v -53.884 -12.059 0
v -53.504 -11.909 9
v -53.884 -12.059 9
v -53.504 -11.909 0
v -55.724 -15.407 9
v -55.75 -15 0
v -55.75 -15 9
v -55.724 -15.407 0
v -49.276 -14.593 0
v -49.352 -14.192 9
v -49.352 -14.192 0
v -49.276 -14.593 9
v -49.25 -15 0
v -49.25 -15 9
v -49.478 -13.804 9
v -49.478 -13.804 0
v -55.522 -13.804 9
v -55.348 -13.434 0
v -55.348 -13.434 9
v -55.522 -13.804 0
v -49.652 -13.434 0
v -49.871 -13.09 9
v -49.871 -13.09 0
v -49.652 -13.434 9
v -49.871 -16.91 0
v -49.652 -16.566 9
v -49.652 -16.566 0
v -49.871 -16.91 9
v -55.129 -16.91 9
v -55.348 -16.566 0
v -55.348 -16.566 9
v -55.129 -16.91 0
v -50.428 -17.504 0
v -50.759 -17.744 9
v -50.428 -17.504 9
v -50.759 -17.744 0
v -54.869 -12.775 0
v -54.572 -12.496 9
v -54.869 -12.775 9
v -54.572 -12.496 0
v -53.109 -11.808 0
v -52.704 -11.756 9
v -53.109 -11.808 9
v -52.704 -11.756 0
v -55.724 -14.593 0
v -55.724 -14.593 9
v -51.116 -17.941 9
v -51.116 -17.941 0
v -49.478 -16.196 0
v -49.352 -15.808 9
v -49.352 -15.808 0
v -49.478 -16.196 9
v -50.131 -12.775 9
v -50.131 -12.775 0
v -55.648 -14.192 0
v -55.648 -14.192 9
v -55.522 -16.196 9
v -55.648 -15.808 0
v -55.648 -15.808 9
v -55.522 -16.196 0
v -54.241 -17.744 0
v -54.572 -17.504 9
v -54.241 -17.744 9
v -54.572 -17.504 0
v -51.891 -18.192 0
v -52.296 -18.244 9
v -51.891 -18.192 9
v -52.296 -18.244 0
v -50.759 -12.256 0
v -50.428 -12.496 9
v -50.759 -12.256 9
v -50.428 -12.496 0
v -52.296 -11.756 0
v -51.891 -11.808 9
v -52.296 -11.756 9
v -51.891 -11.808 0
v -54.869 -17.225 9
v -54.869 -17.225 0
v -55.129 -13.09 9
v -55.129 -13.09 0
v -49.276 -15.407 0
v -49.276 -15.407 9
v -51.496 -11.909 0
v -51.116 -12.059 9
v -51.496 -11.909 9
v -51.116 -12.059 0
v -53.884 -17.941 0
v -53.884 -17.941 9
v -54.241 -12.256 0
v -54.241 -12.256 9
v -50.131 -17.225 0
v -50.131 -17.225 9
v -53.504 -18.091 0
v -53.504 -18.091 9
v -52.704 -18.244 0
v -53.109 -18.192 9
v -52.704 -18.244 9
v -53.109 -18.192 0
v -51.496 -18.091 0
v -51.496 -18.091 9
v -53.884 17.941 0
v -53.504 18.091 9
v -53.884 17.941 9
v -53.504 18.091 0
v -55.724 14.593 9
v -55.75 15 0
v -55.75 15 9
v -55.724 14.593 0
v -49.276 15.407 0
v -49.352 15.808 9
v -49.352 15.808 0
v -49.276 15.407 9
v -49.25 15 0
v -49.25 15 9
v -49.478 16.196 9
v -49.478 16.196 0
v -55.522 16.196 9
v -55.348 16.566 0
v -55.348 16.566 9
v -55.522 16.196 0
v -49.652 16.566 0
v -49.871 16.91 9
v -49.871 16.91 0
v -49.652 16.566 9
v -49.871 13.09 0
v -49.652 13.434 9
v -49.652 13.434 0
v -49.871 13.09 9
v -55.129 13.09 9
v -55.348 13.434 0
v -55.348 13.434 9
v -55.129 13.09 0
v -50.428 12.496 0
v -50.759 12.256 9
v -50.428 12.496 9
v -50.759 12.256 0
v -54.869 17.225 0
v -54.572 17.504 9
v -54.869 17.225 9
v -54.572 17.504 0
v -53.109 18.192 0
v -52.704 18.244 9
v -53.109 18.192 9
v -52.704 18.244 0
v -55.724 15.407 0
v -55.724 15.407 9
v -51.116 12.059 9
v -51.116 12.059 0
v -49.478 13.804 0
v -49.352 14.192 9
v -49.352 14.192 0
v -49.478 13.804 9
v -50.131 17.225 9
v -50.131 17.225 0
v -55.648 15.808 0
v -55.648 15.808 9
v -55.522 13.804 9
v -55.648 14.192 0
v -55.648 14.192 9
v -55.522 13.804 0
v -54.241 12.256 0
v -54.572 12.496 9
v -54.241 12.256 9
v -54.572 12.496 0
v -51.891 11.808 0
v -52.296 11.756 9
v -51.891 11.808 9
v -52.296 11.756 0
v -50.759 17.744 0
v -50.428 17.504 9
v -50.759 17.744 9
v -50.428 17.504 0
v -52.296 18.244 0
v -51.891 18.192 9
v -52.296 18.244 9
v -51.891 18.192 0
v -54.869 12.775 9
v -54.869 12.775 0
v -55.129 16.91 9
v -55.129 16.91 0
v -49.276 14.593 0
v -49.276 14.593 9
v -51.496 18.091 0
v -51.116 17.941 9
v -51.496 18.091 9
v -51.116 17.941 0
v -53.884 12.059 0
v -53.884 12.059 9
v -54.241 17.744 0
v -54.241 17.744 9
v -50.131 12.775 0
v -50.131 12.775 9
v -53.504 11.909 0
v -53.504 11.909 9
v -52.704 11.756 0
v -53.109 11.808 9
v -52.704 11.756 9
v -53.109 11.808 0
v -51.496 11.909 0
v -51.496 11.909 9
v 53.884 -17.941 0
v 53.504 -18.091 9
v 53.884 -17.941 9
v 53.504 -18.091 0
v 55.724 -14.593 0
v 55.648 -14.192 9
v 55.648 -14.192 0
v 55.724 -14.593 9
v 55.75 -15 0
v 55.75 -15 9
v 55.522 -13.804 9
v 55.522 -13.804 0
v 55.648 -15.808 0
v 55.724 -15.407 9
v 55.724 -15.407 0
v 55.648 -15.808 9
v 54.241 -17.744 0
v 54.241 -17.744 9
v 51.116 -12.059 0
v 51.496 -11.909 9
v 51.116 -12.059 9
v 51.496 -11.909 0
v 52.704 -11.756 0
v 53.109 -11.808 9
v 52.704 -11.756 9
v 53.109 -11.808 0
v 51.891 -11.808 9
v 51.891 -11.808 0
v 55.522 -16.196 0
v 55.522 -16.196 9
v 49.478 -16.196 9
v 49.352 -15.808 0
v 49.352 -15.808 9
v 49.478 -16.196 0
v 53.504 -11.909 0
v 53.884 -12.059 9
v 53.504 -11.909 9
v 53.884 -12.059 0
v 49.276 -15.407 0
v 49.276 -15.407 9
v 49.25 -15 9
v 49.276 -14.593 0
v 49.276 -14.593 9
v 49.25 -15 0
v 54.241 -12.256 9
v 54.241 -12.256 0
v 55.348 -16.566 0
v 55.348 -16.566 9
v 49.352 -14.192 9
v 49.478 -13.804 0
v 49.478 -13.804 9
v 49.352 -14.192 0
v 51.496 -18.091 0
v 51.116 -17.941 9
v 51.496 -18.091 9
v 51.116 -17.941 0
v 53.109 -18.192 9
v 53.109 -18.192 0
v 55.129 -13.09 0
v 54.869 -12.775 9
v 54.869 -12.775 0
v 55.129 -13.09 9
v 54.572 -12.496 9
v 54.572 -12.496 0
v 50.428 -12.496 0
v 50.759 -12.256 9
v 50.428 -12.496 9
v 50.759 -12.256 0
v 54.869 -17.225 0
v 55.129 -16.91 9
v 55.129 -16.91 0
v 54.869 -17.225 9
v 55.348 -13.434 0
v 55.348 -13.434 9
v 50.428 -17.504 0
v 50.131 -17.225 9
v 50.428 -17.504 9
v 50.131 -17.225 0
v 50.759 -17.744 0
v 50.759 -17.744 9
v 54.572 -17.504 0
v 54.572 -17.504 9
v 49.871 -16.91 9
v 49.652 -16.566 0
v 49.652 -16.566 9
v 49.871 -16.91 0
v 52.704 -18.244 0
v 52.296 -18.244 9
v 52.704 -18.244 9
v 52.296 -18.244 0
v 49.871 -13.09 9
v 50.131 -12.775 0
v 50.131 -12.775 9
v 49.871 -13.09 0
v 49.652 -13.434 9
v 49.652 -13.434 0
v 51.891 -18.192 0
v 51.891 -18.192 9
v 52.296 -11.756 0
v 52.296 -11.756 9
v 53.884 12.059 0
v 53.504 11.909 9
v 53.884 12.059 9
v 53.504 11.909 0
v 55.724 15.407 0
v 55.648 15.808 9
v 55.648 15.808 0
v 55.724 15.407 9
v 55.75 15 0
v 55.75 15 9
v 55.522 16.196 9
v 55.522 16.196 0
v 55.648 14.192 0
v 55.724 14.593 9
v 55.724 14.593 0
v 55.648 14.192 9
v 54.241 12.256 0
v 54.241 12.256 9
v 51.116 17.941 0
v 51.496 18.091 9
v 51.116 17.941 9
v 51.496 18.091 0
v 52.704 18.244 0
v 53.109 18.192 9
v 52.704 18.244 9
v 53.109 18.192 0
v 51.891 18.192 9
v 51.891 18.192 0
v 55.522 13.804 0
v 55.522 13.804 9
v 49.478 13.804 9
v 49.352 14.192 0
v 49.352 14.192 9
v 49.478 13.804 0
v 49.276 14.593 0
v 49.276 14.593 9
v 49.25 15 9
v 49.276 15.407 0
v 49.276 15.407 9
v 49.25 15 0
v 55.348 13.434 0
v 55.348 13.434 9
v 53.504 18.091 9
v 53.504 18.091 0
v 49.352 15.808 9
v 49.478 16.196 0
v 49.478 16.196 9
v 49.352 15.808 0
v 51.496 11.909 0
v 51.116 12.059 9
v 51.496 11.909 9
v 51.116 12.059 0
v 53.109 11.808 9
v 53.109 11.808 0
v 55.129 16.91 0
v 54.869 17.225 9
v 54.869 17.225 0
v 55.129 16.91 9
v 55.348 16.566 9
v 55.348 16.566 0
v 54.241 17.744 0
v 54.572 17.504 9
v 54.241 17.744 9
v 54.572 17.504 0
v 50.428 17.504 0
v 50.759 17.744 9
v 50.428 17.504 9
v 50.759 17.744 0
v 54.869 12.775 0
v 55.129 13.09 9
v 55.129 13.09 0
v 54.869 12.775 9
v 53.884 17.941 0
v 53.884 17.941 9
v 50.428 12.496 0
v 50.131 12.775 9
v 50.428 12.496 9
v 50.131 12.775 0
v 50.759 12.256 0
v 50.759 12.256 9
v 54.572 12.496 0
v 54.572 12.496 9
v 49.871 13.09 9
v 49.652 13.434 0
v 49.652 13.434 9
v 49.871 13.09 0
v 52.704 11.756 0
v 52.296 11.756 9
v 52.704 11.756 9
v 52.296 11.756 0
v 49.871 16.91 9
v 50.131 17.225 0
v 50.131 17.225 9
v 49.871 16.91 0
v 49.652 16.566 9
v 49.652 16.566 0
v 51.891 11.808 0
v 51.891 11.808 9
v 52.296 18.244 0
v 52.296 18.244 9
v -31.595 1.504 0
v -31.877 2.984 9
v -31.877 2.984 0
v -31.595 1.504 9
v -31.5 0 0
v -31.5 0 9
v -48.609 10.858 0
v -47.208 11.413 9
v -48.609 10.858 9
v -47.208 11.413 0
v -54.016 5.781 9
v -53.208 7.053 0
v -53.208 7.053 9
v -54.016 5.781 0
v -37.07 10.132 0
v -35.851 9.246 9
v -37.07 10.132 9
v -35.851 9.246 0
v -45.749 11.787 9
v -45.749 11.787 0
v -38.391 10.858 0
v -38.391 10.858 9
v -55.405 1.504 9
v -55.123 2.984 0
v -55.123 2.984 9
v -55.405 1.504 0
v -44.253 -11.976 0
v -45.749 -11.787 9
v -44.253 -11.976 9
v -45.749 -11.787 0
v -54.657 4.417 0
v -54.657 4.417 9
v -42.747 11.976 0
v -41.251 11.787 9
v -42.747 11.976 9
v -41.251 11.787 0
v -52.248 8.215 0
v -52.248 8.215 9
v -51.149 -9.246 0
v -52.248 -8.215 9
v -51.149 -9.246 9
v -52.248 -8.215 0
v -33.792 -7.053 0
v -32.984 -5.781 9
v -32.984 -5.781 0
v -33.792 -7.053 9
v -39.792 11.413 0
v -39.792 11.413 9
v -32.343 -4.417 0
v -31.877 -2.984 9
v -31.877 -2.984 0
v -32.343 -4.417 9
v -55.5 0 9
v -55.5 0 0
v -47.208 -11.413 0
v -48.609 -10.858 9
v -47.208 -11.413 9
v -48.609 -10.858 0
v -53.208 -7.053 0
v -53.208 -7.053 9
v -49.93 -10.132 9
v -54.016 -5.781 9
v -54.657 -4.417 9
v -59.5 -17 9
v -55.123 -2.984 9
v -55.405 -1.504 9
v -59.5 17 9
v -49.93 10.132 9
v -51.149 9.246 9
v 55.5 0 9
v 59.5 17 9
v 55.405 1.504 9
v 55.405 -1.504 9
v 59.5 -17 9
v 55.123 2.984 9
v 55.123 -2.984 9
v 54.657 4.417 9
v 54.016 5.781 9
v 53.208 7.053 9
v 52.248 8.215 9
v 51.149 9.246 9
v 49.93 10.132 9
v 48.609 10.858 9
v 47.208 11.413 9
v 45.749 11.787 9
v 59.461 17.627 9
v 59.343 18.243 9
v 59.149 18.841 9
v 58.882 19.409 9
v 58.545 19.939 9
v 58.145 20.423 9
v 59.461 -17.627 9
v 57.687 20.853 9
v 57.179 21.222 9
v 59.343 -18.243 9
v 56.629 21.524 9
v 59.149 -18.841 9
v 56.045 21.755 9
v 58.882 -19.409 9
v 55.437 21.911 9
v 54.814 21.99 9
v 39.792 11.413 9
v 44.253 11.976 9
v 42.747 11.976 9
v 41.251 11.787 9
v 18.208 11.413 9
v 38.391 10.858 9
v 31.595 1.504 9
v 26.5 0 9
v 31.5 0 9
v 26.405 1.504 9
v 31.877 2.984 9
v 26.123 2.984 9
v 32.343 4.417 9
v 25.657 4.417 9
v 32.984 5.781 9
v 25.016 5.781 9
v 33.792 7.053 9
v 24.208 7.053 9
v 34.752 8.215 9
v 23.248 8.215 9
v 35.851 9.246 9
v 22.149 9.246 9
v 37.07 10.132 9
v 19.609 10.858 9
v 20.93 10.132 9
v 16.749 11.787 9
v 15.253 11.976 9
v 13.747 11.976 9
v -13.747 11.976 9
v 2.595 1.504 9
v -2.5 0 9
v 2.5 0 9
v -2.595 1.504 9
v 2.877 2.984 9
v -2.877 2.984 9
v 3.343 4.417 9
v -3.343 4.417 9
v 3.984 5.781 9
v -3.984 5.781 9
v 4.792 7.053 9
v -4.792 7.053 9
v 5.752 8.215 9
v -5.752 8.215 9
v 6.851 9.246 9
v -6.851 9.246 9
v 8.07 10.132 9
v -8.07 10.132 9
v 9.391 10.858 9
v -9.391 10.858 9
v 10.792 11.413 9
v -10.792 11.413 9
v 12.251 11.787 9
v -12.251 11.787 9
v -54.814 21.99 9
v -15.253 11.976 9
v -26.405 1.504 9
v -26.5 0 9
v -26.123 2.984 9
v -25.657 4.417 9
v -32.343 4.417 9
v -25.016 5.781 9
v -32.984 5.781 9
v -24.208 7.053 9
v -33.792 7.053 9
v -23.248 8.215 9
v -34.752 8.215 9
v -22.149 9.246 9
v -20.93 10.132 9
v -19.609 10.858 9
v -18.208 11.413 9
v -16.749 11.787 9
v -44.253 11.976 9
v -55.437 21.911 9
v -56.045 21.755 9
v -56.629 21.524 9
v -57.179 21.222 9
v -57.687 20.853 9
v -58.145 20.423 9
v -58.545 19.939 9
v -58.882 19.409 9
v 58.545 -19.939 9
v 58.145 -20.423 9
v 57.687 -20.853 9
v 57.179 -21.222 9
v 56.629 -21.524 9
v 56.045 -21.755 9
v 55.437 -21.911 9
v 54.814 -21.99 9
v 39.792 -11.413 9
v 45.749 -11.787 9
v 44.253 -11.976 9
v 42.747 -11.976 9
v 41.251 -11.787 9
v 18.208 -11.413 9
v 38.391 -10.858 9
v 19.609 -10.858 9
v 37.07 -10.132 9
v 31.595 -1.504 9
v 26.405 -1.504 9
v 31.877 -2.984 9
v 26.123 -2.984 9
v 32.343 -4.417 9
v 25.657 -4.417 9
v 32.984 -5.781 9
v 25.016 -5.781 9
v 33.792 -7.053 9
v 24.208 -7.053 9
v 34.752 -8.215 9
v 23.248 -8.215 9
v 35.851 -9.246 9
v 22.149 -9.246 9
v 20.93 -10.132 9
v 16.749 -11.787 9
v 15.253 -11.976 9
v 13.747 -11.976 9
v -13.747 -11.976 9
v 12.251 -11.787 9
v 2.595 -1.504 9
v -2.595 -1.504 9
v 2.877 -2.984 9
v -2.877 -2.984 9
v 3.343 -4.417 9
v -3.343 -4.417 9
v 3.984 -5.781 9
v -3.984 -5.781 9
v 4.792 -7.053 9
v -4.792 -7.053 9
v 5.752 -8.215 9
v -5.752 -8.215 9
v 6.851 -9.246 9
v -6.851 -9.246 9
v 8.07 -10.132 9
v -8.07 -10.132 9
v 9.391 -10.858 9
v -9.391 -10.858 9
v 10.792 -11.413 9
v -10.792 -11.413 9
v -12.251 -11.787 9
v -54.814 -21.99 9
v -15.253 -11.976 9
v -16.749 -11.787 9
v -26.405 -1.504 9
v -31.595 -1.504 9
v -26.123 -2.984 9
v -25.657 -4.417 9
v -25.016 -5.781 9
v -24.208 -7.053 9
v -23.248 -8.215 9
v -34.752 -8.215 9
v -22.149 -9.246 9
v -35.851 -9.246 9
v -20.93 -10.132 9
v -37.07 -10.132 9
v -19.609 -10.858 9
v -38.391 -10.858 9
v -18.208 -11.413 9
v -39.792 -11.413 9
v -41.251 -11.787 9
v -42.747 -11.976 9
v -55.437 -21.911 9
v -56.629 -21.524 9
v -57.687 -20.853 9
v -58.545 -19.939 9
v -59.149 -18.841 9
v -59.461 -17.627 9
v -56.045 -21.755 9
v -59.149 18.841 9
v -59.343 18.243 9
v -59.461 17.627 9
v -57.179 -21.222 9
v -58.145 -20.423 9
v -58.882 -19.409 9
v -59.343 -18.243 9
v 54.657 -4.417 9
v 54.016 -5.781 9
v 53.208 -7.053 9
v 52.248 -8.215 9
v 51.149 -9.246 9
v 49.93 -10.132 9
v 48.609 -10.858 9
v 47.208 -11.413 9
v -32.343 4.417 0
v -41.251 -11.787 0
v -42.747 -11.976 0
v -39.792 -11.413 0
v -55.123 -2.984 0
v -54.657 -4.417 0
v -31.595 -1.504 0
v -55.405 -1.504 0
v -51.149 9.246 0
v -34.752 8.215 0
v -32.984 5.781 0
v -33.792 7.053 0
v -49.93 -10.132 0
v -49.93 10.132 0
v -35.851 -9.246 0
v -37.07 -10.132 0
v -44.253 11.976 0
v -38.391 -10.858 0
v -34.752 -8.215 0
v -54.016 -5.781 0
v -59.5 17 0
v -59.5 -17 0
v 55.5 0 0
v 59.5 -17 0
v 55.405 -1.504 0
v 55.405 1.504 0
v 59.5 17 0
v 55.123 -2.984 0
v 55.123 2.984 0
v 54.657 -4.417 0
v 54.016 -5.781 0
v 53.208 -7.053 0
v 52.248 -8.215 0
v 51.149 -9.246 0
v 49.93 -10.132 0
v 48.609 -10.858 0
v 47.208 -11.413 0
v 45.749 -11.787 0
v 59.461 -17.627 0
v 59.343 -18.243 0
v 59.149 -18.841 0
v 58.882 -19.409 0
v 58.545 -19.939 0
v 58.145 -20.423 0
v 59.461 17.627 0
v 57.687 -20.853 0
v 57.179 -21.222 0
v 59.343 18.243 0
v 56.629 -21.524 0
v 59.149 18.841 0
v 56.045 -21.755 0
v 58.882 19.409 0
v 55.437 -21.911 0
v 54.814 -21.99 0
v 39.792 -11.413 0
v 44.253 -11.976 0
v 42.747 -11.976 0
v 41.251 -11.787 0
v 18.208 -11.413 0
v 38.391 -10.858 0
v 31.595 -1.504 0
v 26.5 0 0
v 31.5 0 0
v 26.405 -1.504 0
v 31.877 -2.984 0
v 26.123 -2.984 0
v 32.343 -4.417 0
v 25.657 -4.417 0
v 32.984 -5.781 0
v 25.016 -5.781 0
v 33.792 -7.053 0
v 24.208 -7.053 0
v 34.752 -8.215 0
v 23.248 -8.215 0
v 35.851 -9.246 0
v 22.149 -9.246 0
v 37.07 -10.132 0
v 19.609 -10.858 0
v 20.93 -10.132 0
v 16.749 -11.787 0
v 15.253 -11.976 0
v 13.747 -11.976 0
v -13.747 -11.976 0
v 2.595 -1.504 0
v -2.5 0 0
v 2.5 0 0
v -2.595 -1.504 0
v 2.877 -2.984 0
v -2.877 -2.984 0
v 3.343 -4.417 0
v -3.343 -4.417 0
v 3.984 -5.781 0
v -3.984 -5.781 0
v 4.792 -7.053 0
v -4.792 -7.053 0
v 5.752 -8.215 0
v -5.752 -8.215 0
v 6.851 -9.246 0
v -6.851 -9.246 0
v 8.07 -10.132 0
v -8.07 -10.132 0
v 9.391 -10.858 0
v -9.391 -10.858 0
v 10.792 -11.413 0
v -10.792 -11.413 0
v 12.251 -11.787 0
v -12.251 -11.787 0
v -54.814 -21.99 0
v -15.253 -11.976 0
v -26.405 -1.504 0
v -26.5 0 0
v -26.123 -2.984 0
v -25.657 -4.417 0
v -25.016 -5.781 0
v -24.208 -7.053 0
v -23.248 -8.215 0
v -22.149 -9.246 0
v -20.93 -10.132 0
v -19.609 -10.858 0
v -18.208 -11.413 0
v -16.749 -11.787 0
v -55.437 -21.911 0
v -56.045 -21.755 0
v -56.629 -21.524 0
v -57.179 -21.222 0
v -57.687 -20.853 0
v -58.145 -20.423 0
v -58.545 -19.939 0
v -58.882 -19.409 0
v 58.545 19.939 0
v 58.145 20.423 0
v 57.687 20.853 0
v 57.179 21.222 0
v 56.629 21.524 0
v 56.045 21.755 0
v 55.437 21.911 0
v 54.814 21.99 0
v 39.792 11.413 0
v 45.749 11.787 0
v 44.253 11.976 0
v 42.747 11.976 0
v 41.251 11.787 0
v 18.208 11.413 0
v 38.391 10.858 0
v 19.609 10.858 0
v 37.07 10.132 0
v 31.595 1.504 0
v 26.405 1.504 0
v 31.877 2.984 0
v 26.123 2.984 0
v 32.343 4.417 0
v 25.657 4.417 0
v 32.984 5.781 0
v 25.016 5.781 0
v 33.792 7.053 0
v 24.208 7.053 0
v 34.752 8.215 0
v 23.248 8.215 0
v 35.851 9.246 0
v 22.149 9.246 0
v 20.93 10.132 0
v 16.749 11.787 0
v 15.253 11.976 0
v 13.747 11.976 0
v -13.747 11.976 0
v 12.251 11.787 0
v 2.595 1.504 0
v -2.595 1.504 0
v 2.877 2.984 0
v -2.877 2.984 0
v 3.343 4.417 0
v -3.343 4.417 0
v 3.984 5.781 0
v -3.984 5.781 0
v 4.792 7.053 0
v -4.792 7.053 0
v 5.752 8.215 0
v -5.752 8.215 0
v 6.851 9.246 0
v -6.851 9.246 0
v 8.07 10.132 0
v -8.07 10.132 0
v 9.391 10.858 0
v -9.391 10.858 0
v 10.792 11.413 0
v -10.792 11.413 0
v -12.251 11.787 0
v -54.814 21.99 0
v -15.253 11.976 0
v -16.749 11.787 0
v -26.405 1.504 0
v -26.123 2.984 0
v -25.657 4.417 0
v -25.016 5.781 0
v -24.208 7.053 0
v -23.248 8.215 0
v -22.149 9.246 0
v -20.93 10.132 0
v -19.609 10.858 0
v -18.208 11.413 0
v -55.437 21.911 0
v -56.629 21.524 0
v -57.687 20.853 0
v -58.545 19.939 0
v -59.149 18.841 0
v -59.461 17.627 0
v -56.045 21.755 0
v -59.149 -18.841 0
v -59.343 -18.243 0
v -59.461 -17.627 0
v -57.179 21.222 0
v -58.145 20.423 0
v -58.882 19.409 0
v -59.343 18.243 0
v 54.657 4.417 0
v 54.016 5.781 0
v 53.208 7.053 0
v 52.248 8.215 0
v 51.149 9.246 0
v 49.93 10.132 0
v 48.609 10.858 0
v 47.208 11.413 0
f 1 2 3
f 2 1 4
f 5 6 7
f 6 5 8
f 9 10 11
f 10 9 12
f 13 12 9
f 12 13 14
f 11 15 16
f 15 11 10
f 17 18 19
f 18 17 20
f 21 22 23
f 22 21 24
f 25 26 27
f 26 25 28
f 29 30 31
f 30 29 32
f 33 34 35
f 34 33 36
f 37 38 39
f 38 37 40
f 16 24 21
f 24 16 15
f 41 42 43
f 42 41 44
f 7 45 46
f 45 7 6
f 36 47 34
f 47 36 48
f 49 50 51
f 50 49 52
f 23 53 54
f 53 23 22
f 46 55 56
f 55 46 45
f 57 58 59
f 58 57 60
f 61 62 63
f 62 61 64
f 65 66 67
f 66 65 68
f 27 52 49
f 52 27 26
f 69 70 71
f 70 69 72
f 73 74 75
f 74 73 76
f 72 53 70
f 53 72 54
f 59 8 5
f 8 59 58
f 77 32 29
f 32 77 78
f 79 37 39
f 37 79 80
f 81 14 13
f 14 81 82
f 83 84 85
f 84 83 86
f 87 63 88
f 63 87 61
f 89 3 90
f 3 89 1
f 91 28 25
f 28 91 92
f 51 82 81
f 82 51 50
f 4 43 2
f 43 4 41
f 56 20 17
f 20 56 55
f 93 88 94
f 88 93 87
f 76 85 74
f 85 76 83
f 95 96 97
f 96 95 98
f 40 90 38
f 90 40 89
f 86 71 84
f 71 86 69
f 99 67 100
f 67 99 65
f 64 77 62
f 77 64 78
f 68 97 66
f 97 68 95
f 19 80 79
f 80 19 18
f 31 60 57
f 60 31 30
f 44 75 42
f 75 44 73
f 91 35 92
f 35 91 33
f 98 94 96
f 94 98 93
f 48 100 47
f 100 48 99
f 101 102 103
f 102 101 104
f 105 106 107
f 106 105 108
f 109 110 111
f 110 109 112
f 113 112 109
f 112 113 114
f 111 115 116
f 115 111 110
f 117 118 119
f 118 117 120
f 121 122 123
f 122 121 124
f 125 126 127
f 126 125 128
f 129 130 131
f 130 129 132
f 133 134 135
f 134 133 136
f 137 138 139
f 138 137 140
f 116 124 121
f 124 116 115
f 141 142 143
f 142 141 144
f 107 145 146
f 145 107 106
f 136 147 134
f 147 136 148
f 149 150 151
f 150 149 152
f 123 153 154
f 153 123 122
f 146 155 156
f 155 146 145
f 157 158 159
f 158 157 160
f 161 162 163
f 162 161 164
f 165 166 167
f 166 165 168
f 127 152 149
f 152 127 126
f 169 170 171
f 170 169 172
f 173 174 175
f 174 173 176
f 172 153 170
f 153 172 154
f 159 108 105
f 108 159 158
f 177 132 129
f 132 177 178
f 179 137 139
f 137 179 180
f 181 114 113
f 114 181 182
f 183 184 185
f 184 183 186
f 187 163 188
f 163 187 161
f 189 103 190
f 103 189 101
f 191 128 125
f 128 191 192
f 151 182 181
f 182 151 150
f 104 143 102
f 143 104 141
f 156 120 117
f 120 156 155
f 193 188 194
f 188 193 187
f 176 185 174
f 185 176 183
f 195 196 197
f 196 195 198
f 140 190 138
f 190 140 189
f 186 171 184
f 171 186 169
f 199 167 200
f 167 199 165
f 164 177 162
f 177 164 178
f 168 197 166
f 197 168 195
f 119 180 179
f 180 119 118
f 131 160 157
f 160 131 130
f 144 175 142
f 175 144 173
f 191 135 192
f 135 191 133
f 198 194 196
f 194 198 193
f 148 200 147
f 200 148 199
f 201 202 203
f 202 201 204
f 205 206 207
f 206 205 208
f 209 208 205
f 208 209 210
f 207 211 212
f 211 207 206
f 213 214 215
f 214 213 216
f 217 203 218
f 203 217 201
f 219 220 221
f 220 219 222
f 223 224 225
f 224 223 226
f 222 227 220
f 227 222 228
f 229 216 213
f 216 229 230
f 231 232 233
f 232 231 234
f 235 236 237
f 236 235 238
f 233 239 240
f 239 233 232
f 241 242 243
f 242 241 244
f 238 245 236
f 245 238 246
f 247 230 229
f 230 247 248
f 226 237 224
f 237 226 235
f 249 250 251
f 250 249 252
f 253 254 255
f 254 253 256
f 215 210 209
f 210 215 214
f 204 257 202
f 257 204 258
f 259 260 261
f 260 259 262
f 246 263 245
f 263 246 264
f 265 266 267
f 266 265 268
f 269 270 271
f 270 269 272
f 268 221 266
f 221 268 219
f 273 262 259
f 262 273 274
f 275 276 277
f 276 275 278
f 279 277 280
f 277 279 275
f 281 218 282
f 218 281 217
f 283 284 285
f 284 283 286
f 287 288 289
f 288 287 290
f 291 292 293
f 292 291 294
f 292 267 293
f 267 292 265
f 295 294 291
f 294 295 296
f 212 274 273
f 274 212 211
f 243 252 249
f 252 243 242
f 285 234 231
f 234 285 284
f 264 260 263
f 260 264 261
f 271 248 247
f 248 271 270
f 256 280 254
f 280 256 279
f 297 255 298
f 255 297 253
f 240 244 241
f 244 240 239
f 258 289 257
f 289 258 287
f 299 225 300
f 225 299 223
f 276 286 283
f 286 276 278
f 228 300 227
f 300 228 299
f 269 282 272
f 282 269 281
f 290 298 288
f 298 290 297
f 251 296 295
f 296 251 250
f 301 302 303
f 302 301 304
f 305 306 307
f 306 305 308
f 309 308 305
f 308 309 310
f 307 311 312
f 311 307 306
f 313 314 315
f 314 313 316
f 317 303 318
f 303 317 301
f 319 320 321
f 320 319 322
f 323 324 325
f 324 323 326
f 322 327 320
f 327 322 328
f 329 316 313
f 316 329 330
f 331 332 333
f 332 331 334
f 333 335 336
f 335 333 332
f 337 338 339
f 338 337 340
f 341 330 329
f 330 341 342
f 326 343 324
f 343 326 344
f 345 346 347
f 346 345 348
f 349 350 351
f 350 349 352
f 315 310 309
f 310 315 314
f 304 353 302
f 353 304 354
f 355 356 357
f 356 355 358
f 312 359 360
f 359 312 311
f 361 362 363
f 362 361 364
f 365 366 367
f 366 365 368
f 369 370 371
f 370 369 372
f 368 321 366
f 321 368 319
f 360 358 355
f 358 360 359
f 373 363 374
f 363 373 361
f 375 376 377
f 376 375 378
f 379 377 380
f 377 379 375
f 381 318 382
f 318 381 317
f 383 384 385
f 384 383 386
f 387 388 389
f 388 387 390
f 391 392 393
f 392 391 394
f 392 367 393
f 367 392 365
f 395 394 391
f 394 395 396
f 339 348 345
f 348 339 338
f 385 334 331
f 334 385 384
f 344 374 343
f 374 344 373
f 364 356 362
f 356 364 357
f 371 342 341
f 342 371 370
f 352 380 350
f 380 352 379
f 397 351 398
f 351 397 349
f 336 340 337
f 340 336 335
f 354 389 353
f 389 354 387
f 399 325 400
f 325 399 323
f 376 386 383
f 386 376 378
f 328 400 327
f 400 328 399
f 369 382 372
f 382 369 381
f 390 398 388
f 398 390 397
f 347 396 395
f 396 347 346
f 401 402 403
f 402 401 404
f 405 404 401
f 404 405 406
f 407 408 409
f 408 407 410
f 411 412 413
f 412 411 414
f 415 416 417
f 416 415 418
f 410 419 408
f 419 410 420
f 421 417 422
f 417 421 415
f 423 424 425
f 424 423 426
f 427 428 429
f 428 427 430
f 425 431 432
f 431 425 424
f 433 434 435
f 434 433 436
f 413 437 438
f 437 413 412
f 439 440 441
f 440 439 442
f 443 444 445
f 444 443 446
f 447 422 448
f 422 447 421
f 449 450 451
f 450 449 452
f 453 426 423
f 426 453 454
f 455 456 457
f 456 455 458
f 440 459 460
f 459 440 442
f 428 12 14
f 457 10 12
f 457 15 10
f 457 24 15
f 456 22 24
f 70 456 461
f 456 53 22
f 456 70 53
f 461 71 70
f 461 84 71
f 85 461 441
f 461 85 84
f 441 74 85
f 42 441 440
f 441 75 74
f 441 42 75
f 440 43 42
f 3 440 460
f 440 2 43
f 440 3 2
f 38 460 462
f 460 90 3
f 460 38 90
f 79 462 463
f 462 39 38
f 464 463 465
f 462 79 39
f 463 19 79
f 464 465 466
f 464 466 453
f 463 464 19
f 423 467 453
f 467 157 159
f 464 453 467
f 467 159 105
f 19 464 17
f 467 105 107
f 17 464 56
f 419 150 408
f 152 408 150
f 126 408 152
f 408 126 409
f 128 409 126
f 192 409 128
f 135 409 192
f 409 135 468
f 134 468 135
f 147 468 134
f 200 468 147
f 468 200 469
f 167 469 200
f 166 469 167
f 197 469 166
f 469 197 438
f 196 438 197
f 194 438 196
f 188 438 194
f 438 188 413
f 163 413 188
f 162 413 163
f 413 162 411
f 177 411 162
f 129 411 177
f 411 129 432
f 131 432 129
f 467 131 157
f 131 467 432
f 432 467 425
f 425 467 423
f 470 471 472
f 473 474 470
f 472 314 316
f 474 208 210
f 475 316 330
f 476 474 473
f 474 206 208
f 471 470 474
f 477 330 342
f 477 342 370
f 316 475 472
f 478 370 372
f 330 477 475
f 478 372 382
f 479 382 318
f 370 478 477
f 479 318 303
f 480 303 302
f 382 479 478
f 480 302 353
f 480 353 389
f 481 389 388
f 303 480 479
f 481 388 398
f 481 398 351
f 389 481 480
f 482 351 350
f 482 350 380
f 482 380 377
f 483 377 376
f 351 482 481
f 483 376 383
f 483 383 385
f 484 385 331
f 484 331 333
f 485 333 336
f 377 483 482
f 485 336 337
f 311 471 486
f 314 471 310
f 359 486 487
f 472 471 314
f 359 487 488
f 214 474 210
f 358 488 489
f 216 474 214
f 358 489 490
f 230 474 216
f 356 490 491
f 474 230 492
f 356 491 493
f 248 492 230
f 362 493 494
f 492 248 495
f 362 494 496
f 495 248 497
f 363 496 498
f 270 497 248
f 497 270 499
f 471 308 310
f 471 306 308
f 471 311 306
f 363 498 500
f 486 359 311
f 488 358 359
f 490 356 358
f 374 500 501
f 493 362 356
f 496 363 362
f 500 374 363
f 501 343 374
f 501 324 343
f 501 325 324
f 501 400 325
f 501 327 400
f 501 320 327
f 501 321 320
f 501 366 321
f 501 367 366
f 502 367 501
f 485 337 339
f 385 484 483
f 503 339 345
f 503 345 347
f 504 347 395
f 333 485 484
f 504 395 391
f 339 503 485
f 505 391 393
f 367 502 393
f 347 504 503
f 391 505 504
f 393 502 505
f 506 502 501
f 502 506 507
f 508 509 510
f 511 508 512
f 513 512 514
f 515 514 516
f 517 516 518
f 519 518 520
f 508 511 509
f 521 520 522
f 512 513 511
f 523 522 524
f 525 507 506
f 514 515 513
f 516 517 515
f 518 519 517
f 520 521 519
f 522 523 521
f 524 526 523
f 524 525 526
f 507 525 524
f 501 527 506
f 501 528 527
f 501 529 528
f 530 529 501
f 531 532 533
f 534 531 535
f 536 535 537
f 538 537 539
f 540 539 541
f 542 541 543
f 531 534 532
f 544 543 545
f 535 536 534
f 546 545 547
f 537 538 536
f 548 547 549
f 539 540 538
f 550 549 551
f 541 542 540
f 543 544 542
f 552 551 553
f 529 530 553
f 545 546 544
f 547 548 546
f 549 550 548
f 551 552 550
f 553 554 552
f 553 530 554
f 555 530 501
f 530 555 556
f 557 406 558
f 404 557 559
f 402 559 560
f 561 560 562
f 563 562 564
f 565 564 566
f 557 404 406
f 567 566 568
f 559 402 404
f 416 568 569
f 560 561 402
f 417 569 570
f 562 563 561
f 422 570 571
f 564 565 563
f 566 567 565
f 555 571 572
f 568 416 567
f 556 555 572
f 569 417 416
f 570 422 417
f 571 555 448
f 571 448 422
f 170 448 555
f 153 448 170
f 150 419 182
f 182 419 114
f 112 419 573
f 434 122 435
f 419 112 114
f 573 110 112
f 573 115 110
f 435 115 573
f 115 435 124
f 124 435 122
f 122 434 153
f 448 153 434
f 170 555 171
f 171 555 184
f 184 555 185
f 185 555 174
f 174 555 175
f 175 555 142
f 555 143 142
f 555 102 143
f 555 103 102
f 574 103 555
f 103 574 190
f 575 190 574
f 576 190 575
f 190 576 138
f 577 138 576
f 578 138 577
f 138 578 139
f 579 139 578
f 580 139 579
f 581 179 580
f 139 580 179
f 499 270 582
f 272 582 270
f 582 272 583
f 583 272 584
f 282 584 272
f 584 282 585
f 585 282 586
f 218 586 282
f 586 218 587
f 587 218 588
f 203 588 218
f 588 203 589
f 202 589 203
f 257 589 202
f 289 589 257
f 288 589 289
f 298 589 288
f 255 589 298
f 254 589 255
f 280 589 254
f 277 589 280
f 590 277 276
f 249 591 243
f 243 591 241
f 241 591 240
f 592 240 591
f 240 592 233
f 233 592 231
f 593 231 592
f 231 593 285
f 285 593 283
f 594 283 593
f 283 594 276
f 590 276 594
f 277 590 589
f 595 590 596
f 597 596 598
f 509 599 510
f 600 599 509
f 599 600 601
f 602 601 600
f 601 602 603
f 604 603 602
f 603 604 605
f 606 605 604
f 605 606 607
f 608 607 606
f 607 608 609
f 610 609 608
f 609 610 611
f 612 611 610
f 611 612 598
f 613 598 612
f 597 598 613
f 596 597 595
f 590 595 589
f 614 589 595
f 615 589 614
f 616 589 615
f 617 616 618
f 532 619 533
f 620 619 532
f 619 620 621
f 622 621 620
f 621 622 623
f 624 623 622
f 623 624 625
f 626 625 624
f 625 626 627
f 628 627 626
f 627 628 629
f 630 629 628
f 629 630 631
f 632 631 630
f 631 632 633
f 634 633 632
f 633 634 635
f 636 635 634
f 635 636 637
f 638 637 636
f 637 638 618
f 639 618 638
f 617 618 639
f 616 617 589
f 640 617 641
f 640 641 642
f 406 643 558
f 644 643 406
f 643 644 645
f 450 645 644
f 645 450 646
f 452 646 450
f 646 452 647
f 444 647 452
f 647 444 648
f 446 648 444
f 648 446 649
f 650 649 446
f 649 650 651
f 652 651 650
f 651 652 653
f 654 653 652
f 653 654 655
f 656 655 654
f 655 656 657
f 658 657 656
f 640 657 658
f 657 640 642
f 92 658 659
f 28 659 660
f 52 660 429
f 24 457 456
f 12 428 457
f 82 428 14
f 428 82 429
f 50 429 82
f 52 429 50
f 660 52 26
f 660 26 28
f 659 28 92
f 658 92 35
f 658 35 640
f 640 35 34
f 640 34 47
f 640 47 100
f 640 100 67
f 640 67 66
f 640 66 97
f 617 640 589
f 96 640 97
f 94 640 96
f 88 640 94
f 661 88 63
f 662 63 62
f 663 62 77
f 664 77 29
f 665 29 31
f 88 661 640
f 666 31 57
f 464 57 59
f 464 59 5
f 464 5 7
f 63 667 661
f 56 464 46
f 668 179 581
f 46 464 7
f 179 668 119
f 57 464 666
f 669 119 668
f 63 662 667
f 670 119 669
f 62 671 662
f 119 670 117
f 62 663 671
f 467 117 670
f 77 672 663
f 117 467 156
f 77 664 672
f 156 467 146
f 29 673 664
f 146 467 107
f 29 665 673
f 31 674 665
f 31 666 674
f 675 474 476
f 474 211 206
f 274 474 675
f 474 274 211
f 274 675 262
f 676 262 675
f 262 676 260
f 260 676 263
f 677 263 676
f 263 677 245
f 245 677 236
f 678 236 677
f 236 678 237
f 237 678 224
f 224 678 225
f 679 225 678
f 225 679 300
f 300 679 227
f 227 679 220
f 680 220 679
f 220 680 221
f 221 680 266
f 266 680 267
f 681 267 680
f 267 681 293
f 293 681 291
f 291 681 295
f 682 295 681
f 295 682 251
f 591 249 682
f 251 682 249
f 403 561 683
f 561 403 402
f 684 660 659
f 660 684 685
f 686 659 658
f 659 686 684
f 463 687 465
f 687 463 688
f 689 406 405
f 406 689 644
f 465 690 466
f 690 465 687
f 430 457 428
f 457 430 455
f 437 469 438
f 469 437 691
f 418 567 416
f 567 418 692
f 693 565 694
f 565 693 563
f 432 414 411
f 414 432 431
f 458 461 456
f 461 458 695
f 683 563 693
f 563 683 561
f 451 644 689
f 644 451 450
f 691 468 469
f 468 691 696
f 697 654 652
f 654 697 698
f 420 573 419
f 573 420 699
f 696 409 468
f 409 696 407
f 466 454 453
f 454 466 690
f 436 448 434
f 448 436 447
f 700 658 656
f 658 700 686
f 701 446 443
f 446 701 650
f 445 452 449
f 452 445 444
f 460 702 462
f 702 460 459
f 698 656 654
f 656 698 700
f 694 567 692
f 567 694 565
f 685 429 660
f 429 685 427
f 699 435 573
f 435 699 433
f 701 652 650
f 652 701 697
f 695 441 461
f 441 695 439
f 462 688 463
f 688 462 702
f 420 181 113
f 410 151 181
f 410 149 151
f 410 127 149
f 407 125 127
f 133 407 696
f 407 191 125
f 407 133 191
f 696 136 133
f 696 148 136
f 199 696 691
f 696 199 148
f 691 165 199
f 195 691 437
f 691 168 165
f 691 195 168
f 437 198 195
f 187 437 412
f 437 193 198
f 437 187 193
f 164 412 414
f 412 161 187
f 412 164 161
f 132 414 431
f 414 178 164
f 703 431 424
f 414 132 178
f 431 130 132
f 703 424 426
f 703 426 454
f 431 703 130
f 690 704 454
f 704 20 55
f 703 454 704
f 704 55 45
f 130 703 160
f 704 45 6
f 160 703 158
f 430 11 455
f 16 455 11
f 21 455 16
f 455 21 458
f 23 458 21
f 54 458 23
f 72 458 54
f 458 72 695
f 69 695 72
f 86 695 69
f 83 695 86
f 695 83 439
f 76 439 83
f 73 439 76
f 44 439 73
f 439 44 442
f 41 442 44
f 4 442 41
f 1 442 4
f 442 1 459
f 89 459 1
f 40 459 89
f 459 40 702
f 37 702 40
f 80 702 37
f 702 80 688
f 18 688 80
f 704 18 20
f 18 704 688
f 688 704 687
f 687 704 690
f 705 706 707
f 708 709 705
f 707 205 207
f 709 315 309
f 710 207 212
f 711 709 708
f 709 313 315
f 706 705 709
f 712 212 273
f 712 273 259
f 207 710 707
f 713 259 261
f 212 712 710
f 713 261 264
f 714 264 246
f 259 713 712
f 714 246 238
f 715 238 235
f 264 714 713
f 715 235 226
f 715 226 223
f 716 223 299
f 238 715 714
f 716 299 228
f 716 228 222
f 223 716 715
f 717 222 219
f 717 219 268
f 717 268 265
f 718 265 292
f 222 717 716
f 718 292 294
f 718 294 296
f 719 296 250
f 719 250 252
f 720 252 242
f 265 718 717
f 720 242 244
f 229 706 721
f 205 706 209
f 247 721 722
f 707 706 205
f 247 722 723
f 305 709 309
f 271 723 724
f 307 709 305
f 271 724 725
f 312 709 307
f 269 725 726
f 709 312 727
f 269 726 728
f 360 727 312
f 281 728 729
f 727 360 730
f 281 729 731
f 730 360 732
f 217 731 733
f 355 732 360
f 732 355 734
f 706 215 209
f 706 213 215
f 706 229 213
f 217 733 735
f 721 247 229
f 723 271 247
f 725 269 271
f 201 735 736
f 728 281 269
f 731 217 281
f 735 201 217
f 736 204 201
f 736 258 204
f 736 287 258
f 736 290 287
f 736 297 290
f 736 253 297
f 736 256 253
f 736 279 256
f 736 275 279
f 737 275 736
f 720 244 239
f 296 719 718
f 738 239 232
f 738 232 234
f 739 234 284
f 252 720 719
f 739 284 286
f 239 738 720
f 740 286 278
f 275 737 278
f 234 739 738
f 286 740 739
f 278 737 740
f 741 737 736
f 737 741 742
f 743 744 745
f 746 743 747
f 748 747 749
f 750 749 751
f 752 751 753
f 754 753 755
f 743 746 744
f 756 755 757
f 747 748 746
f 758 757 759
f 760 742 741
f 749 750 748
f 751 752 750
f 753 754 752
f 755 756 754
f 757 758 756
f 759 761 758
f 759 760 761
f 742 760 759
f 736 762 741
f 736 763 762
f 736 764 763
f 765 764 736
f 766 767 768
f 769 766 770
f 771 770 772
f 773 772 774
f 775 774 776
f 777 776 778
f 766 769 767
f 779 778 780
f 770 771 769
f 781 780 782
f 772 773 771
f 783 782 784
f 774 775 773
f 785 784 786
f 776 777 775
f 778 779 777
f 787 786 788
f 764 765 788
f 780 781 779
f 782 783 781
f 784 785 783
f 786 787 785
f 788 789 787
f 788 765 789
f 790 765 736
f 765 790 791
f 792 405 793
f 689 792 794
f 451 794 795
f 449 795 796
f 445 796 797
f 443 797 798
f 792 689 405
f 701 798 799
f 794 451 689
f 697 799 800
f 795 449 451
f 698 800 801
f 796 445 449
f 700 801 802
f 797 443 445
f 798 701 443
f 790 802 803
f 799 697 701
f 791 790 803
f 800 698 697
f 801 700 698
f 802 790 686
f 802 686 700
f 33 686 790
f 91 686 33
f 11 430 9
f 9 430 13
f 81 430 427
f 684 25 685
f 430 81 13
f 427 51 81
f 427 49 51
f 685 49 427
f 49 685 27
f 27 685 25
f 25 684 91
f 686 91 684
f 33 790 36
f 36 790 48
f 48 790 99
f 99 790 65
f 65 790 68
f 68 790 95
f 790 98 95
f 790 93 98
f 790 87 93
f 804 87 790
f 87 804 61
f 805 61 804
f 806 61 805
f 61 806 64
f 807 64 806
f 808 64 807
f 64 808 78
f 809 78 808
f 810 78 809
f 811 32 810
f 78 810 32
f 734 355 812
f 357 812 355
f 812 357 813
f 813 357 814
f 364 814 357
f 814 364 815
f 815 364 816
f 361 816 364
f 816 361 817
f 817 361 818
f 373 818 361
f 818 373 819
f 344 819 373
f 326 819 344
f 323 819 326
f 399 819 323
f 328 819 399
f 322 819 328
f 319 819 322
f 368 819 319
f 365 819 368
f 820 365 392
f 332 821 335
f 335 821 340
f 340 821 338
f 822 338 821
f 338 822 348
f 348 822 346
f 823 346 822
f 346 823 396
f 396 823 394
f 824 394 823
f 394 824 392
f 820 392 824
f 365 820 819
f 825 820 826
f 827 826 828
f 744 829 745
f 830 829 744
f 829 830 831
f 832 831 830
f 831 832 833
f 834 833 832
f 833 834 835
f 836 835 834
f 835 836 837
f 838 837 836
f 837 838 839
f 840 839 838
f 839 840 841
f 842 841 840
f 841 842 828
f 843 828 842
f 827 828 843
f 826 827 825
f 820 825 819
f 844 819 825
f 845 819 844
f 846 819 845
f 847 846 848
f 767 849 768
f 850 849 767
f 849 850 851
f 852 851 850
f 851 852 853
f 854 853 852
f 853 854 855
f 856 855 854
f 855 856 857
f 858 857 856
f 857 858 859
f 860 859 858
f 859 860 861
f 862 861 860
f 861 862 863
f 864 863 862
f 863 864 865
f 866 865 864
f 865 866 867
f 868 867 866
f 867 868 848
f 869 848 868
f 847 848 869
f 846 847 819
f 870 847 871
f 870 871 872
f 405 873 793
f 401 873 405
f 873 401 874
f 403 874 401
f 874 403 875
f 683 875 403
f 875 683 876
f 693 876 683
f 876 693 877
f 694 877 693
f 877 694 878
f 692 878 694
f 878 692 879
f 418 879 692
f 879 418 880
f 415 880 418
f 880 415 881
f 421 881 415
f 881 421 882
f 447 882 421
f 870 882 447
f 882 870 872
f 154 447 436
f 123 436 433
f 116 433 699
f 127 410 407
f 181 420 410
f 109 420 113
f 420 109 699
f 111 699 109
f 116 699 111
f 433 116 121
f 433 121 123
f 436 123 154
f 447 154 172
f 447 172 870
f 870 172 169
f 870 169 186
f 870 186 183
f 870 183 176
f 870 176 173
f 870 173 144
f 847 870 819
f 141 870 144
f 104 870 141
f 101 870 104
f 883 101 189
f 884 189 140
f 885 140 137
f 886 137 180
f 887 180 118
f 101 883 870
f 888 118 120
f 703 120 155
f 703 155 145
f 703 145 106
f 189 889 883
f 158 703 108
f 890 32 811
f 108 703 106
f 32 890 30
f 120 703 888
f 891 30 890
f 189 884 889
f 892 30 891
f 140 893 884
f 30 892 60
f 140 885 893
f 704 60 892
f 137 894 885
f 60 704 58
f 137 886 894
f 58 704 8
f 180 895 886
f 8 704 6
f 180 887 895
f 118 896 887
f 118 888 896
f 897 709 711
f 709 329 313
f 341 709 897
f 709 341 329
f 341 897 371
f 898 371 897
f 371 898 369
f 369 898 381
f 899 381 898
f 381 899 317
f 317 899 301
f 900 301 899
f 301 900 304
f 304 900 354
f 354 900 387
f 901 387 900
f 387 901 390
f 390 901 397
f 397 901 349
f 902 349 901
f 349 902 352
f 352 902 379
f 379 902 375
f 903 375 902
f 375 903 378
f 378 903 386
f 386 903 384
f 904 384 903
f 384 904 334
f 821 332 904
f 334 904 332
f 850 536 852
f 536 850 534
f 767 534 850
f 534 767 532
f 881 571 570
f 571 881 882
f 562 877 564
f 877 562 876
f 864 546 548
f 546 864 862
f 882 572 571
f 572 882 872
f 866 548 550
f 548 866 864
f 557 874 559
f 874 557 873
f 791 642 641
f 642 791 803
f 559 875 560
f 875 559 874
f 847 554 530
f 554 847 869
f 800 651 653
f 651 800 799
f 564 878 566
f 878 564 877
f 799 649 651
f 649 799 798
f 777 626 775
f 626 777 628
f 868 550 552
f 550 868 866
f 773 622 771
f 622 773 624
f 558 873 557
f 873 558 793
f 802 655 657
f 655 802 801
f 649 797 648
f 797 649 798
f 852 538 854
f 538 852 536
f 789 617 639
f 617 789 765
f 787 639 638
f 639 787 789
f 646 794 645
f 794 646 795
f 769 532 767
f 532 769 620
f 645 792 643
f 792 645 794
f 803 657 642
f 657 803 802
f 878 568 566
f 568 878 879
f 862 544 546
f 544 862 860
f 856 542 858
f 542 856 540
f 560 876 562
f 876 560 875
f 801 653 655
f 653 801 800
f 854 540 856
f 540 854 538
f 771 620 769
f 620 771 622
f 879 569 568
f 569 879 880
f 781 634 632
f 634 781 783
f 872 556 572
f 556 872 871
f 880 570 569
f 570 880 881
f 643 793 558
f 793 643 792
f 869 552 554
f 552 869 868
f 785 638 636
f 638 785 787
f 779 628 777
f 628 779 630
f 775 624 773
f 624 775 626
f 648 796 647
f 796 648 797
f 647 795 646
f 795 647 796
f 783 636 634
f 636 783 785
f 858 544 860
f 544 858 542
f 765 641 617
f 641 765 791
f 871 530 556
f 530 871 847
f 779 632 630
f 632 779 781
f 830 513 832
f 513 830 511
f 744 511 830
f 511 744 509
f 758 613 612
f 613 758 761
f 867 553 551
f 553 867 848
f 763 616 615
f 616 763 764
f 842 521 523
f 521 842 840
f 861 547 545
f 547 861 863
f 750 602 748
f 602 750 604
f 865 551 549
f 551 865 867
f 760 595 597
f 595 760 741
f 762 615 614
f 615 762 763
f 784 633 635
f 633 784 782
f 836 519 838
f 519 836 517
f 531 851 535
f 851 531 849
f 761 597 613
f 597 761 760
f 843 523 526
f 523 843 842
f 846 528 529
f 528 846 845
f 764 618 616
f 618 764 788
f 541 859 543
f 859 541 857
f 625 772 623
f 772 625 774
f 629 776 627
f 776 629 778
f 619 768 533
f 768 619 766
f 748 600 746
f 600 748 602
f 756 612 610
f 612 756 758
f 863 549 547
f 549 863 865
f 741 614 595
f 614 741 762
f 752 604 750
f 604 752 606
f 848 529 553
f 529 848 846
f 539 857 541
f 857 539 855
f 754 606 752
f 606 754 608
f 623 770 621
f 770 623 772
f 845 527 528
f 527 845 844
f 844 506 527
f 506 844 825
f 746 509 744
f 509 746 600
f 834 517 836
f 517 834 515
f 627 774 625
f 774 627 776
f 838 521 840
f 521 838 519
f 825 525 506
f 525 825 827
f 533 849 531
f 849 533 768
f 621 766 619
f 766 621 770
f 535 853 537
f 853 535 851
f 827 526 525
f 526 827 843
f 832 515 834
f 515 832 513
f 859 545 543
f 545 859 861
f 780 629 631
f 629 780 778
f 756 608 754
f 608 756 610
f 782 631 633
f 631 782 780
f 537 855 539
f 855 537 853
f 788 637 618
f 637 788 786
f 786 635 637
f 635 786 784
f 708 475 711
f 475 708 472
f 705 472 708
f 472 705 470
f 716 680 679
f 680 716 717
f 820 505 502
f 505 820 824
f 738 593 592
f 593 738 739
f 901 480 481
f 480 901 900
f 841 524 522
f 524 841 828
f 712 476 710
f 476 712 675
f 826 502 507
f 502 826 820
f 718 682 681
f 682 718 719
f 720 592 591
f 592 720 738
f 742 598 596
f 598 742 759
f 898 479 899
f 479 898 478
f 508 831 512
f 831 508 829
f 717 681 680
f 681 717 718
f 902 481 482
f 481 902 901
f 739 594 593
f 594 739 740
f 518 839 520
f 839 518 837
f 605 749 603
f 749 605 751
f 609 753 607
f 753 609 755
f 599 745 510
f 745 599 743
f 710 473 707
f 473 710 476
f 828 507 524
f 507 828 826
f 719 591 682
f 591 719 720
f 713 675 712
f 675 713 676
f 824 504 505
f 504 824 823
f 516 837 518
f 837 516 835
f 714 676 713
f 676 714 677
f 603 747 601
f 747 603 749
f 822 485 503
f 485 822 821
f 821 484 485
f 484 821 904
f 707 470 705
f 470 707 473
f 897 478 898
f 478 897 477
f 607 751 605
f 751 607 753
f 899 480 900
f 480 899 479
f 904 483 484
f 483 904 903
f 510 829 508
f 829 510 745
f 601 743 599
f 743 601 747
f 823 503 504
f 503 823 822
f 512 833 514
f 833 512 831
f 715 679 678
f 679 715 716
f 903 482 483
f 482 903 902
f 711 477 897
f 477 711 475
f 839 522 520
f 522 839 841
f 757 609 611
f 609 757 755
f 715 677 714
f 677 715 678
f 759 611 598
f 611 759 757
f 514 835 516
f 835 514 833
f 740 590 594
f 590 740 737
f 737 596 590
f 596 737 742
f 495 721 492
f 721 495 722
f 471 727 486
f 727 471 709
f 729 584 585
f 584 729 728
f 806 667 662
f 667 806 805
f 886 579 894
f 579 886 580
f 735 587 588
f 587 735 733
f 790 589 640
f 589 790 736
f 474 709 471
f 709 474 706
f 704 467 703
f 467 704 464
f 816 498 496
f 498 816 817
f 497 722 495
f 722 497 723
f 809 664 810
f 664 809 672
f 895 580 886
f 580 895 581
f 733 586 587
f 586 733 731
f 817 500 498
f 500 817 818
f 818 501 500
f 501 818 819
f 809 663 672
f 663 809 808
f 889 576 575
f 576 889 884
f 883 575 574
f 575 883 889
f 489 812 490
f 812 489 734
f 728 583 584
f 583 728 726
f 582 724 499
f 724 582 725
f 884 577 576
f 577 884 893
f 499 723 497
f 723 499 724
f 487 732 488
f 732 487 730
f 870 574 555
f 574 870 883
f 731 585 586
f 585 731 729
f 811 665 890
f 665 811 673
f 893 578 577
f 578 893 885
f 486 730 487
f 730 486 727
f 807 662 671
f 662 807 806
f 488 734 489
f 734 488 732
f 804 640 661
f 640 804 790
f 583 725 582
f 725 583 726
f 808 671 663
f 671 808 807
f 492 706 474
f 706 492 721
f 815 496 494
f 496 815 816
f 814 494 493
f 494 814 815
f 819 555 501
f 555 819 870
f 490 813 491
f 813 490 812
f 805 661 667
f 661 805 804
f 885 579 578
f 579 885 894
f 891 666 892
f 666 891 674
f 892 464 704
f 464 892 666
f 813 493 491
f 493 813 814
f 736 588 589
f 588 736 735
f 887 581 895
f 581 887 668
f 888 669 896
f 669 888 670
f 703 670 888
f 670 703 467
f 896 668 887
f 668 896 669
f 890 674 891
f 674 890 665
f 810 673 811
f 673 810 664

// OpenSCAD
$fn = 50;

difference() {
	union() {
		hull() {
			translate(v = [-54.5, 17.0, 0]) {
				cylinder(h = 9, r = 5);
			}
			translate(v = [54.5, 17.0, 0]) {
				cylinder(h = 9, r = 5);
			}
			translate(v = [-54.5, -17.0, 0]) {
				cylinder(h = 9, r = 5);
			}
			translate(v = [54.5, -17.0, 0]) {
				cylinder(h = 9, r = 5);
			}
		}
	}
	union() {
		translate(v = [-52.5, -15.0, -100.0]) {
			cylinder(h = 200, r = 3.25);
		}
		translate(v = [-52.5, 15.0, -100.0]) {
			cylinder(h = 200, r = 3.25);
		}
		translate(v = [52.5, -15.0, -100.0]) {
			cylinder(h = 200, r = 3.25);
		}
		translate(v = [52.5, 15.0, -100.0]) {
			cylinder(h = 200, r = 3.25);
		}
		translate(v = [-52.5, -15.0, -100.0]) {
			cylinder(h = 200, r = 1.8);
		}
		translate(v = [-52.5, 15.0, -100.0]) {
			cylinder(h = 200, r = 1.8);
		}
		translate(v = [52.5, -15.0, -100.0]) {
			cylinder(h = 200, r = 1.8);
		}
		translate(v = [52.5, 15.0, -100.0]) {
			cylinder(h = 200, r = 1.8);
		}
		translate(v = [-43.5, 0, 0.0]) {
			cylinder(h = 9, r = 12.0);
		}
		translate(v = [-14.5, 0, 0.0]) {
			cylinder(h = 9, r = 12.0);
		}
		translate(v = [14.5, 0, 0.0]) {
			cylinder(h = 9, r = 12.0);
		}
		translate(v = [43.5, 0, 0.0]) {
			cylinder(h = 9, r = 12.0);
		}
	}
}
